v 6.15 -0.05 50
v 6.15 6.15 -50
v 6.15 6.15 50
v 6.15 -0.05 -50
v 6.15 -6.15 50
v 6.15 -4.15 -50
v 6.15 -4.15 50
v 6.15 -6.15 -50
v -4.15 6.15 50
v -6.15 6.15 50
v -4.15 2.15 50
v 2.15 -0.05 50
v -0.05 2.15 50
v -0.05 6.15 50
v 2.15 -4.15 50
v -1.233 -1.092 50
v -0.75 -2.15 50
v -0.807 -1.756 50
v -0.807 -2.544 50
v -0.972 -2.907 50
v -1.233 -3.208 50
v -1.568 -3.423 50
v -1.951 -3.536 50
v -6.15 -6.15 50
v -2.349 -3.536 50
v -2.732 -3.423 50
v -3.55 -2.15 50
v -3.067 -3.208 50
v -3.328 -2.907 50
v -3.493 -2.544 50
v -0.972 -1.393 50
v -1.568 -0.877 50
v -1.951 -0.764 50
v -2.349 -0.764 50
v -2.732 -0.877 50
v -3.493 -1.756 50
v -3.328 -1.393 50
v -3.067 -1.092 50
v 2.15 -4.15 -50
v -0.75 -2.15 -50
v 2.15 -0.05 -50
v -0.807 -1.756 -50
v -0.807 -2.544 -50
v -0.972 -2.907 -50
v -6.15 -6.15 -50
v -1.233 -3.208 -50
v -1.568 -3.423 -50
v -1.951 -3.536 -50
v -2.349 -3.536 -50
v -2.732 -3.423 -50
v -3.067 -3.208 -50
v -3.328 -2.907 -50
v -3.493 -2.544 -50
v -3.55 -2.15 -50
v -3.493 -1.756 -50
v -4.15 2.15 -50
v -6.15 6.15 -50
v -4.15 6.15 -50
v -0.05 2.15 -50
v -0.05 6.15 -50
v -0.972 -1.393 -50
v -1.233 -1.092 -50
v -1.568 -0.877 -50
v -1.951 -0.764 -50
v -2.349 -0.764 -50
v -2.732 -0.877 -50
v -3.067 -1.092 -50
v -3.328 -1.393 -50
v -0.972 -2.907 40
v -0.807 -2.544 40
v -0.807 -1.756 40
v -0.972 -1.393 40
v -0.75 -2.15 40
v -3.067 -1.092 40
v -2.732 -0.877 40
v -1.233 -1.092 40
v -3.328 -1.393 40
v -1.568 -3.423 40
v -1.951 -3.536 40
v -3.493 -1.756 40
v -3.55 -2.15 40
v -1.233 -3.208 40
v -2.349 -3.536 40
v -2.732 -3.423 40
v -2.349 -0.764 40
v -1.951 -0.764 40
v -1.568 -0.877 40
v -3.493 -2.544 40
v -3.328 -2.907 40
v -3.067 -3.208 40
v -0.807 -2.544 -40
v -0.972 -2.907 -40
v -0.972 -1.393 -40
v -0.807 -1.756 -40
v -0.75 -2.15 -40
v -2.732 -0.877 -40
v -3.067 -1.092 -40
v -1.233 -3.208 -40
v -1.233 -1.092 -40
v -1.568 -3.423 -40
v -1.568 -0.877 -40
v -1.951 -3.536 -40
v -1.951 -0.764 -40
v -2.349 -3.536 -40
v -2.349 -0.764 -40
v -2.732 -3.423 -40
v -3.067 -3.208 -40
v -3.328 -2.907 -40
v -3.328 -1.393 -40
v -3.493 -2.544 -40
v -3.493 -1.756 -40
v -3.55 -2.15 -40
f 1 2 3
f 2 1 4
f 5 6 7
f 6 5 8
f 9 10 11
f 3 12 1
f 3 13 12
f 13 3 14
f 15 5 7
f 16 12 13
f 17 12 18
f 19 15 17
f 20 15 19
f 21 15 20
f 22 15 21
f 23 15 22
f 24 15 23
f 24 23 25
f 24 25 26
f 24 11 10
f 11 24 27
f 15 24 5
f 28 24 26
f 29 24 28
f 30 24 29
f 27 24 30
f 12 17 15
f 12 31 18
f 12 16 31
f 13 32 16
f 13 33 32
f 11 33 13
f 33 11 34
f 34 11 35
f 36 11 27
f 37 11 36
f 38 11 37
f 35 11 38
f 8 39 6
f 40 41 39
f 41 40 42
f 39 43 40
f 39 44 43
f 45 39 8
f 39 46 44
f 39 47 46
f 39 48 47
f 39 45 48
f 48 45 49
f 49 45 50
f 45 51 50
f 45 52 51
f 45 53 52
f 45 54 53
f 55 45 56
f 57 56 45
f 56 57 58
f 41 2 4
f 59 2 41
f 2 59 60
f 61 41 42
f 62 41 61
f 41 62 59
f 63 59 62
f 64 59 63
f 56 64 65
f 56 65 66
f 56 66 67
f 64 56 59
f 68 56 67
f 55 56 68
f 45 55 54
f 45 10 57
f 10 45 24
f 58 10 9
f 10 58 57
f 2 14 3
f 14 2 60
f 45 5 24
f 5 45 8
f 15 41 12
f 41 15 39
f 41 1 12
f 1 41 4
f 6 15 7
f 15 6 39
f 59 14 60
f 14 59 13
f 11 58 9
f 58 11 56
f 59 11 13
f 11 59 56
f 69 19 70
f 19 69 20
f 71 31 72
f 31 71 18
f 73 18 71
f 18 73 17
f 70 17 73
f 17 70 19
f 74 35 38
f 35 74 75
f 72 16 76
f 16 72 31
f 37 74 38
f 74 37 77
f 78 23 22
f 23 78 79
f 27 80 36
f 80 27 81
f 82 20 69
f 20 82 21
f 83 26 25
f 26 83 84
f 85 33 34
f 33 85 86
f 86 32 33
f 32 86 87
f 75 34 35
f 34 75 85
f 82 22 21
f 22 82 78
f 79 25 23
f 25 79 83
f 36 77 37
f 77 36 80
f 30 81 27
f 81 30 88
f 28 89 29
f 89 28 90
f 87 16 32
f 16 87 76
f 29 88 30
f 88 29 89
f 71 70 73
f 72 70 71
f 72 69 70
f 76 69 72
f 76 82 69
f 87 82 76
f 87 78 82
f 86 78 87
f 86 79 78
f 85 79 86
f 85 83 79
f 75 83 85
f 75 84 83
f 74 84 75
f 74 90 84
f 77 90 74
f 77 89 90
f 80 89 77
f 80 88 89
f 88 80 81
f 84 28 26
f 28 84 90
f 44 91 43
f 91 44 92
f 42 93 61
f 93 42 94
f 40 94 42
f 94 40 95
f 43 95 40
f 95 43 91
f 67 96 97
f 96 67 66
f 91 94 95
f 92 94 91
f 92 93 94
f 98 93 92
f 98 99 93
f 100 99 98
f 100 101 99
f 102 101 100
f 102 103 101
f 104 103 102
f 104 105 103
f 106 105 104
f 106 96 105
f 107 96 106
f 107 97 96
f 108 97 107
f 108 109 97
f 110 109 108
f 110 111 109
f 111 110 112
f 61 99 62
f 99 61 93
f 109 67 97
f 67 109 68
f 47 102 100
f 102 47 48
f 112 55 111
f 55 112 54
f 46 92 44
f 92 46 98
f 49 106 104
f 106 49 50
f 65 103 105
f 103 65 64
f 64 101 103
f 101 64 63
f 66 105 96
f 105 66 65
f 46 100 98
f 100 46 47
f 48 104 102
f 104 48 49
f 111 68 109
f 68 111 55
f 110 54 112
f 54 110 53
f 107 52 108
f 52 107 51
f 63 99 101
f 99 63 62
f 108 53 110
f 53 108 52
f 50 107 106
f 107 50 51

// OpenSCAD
$fa = 1;
$fs = 0.4;

pic_width=104;
pic_depth=3.3;

post_h = pic_width - 4;
cut_d = 8;
//post_w = pic_depth + 5 + cut_d - 1;
post_w = pic_depth + 9;

difference() {
    cube([post_w, post_w, post_h], center=true);

    // cutout for pictures
    
    cut_w = pic_depth + .8;
    cutout_xy = post_w / 2 - cut_w / 2 - 2;
    translate([post_w / 2, -cutout_xy, 0])
    cube([cut_d, cut_w, post_h + .001], center=true);
    translate([-cutout_xy, post_w / 2, 0])
    cube([cut_w, cut_d, post_h + .001], center=true);

    // screw holes
    translate([-(post_w / 2 - 4), -(post_w / 2 - 4), post_h / 2])
    cylinder(h = 20, r = 1.4, center = true);
    translate([-(post_w / 2 - 4), -(post_w / 2 - 4), -post_h / 2])
    cylinder(h = 20, r = 1.4, center = true);
}
